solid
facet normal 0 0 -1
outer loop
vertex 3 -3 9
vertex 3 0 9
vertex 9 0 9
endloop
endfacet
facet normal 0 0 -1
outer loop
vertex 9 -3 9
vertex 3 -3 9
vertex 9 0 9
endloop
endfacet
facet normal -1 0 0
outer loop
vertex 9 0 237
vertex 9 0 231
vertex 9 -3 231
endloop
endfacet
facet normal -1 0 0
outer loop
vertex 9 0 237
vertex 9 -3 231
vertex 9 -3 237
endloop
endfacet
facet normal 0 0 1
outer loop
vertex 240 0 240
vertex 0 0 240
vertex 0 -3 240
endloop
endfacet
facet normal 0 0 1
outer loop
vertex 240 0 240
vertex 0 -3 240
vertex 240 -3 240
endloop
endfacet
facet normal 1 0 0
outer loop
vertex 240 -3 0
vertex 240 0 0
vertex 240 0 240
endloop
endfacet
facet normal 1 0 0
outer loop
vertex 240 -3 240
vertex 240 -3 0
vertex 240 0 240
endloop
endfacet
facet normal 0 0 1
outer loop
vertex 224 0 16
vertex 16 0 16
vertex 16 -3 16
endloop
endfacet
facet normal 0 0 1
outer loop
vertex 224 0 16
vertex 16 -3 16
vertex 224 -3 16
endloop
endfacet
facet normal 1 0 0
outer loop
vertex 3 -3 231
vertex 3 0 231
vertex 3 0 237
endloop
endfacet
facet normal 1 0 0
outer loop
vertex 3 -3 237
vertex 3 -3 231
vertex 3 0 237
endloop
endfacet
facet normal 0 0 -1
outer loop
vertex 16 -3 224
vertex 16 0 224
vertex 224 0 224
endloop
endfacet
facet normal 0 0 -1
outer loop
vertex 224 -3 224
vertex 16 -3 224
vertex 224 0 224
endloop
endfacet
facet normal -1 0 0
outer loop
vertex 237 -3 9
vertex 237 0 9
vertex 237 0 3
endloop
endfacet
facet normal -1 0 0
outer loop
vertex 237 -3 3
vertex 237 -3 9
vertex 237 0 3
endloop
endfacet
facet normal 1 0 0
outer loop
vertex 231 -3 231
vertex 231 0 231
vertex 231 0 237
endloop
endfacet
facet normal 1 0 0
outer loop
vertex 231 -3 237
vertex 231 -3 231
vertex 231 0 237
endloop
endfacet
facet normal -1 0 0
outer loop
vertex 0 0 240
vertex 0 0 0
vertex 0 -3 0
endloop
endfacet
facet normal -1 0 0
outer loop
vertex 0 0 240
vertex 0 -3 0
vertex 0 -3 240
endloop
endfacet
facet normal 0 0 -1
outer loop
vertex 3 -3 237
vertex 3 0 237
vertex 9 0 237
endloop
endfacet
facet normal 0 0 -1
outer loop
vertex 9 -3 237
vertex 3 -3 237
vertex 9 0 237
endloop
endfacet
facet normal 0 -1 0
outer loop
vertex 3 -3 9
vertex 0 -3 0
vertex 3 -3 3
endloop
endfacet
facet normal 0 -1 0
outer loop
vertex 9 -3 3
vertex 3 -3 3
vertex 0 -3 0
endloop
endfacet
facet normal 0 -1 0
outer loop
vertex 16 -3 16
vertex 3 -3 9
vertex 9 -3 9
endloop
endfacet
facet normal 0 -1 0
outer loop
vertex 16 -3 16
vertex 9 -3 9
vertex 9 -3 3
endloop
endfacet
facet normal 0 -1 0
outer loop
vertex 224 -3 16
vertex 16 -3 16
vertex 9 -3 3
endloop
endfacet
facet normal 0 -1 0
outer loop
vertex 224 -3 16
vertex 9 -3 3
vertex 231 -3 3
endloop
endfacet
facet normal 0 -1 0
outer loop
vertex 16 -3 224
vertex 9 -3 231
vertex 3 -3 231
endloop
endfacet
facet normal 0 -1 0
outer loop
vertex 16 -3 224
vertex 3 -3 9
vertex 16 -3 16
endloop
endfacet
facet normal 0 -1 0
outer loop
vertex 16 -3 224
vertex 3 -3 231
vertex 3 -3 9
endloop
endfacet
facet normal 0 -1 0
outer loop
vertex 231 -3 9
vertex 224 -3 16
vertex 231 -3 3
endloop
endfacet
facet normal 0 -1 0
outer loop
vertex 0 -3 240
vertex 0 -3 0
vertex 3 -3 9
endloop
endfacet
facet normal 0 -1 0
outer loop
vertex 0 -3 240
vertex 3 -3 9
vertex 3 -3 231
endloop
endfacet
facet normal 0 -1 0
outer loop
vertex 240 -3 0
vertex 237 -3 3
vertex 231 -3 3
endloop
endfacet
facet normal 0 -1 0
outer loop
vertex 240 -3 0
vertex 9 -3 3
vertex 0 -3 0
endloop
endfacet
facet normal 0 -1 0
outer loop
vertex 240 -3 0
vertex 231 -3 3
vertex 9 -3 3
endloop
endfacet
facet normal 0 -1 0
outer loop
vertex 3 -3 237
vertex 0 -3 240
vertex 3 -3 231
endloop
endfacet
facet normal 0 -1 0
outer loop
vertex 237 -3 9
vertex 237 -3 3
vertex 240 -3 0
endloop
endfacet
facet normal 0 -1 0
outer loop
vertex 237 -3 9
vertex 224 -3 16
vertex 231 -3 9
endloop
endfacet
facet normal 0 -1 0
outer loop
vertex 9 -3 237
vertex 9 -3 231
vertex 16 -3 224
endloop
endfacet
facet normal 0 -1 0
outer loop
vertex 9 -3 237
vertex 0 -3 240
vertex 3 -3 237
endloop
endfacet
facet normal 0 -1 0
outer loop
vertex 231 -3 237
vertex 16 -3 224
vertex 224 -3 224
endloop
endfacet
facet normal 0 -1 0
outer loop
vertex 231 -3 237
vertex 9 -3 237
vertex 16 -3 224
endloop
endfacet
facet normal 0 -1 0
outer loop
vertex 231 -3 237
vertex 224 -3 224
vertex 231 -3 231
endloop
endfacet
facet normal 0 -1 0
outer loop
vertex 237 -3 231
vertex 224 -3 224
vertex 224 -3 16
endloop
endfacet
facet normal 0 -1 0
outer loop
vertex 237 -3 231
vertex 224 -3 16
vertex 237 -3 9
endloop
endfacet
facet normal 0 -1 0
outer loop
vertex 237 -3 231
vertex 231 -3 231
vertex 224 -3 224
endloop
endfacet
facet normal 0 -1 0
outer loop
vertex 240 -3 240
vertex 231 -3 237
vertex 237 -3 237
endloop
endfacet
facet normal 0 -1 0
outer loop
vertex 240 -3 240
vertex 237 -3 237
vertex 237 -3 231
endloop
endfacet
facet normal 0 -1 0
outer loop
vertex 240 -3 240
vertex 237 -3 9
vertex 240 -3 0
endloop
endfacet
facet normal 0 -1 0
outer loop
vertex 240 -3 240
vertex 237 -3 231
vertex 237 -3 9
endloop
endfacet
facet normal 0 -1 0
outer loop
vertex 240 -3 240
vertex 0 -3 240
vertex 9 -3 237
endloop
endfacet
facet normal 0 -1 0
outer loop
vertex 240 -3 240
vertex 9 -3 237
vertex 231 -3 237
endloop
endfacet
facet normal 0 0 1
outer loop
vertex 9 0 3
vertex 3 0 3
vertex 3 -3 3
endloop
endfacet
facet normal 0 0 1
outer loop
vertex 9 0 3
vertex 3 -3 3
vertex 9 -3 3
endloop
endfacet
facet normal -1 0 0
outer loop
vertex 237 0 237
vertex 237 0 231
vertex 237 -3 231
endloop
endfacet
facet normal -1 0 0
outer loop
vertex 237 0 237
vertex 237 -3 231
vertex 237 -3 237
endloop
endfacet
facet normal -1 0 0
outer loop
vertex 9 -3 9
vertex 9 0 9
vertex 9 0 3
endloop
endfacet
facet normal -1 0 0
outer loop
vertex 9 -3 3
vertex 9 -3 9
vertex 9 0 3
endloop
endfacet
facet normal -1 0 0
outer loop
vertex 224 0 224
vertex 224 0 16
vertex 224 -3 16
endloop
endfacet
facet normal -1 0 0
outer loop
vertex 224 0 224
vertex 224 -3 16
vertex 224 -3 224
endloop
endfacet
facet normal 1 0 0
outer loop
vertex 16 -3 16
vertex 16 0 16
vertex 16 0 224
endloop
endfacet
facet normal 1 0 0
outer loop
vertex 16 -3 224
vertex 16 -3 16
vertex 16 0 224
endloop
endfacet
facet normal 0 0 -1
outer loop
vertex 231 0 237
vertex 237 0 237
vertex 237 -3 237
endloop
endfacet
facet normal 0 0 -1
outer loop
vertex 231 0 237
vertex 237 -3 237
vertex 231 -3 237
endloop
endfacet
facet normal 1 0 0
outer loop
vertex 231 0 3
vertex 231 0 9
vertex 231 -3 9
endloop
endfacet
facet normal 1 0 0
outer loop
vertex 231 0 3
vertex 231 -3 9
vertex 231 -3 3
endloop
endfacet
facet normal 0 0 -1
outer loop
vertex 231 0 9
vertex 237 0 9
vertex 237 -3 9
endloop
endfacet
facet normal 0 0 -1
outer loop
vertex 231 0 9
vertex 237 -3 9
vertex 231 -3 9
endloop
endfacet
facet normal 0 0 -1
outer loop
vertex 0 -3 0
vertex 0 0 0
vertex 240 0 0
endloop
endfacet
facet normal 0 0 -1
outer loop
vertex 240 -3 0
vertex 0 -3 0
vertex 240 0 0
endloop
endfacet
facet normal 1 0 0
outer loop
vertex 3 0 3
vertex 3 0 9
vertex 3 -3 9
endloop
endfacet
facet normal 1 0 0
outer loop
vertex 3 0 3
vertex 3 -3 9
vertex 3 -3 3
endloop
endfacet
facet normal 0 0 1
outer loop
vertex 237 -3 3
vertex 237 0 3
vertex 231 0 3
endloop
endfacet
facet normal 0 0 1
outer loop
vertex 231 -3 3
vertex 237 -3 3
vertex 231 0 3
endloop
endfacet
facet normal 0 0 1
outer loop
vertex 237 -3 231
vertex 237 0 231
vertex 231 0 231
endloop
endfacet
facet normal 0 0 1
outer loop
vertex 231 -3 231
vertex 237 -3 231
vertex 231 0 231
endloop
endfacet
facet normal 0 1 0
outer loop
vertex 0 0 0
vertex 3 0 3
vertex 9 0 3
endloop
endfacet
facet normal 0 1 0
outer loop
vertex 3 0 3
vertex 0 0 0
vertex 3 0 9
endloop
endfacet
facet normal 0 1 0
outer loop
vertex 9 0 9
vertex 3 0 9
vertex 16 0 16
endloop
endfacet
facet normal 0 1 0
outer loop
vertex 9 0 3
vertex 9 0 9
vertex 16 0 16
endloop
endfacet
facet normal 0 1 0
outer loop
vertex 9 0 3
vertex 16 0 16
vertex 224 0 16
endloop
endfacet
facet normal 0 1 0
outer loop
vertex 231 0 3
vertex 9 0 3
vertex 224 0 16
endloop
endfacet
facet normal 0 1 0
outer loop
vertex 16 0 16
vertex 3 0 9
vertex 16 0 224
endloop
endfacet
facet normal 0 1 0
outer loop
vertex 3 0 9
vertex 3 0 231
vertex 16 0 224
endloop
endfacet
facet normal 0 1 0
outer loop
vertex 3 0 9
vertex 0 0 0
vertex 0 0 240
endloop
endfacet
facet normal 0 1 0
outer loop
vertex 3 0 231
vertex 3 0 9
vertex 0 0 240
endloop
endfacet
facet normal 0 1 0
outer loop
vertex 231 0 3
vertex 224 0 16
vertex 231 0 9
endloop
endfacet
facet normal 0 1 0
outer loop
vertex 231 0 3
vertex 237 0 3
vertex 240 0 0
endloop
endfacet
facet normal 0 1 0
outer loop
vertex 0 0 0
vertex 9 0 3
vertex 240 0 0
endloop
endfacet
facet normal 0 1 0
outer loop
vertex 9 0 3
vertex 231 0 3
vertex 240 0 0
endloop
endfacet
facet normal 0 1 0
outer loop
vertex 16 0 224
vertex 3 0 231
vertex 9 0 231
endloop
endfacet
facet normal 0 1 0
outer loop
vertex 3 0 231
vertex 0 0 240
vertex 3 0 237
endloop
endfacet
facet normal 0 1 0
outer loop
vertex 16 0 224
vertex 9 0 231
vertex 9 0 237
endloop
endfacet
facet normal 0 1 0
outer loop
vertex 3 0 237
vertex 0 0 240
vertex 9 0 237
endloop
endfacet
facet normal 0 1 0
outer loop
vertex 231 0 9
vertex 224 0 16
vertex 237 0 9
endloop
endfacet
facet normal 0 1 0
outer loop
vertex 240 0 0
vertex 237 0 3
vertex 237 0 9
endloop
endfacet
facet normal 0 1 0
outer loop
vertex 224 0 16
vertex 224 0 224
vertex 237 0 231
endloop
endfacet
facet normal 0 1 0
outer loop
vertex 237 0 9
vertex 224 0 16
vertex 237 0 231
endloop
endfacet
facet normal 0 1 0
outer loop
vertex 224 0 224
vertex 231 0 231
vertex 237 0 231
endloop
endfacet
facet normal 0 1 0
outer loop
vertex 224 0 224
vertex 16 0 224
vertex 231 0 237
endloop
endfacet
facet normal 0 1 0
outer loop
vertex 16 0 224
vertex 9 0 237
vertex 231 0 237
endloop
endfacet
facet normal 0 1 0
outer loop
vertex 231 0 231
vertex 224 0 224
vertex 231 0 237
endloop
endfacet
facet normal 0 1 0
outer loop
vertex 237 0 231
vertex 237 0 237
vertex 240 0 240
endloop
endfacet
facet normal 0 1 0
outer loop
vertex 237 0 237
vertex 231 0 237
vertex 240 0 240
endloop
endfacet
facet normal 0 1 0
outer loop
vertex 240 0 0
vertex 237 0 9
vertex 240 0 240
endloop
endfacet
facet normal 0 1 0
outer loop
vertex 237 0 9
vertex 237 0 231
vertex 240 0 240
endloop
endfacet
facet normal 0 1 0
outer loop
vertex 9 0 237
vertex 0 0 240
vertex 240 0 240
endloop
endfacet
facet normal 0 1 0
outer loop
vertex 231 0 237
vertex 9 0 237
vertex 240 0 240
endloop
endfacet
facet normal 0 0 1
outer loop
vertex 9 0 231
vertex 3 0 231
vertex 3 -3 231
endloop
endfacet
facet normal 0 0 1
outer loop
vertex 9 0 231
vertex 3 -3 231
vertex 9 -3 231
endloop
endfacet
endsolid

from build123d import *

# Parameters (mm, degrees)
F1_W     = 240
F1_H     = 240
F1_W_2   = 6
F1_H_2   = 6
F1_W_3   = 208
F1_H_3   = 208
F2_DEPTH = 3
F3_DEPTH = 25


with BuildPart() as f2:
    # F1 (on Front) → F2 (new body)
    with BuildSketch(Plane.XZ):
        with Locations((120, 120)):
            Rectangle(F1_W, F1_H)
        with Locations((6, 234)):
            Rectangle(F1_W_2, F1_H_2, mode=Mode.SUBTRACT)
        with Locations((120, 120)):
            Rectangle(F1_W_3, F1_H_3, mode=Mode.SUBTRACT)
        with Locations((6, 234)):
            Rectangle(F1_W_2, F1_H_2)
    extrude(amount=F2_DEPTH)

    # F1 (on Front) → F3 (cut)
    with BuildSketch(Plane.XZ):
        with Locations((6, 234)):
            Rectangle(F1_W_2, F1_H_2)
    extrude(amount=F3_DEPTH, mode=Mode.SUBTRACT)

    # F5: F2 across plane


with BuildPart() as f2_1:
    add(f2.part)
    add(f2.part.mirror(Plane(origin=(120, -1.5, 120), x_dir=(0, -1, 0), z_dir=(-1, 0, 0))), mode=Mode.INTERSECT)

    # F7: F2 across plane


with BuildPart() as f2_2:
    add(f2_1.part)
    add(f2_1.part.mirror(Plane(origin=(120, -1.5, 120), x_dir=(1, 0, 0), z_dir=(0, 0, 1))), mode=Mode.INTERSECT)


solid = f2_2.part
